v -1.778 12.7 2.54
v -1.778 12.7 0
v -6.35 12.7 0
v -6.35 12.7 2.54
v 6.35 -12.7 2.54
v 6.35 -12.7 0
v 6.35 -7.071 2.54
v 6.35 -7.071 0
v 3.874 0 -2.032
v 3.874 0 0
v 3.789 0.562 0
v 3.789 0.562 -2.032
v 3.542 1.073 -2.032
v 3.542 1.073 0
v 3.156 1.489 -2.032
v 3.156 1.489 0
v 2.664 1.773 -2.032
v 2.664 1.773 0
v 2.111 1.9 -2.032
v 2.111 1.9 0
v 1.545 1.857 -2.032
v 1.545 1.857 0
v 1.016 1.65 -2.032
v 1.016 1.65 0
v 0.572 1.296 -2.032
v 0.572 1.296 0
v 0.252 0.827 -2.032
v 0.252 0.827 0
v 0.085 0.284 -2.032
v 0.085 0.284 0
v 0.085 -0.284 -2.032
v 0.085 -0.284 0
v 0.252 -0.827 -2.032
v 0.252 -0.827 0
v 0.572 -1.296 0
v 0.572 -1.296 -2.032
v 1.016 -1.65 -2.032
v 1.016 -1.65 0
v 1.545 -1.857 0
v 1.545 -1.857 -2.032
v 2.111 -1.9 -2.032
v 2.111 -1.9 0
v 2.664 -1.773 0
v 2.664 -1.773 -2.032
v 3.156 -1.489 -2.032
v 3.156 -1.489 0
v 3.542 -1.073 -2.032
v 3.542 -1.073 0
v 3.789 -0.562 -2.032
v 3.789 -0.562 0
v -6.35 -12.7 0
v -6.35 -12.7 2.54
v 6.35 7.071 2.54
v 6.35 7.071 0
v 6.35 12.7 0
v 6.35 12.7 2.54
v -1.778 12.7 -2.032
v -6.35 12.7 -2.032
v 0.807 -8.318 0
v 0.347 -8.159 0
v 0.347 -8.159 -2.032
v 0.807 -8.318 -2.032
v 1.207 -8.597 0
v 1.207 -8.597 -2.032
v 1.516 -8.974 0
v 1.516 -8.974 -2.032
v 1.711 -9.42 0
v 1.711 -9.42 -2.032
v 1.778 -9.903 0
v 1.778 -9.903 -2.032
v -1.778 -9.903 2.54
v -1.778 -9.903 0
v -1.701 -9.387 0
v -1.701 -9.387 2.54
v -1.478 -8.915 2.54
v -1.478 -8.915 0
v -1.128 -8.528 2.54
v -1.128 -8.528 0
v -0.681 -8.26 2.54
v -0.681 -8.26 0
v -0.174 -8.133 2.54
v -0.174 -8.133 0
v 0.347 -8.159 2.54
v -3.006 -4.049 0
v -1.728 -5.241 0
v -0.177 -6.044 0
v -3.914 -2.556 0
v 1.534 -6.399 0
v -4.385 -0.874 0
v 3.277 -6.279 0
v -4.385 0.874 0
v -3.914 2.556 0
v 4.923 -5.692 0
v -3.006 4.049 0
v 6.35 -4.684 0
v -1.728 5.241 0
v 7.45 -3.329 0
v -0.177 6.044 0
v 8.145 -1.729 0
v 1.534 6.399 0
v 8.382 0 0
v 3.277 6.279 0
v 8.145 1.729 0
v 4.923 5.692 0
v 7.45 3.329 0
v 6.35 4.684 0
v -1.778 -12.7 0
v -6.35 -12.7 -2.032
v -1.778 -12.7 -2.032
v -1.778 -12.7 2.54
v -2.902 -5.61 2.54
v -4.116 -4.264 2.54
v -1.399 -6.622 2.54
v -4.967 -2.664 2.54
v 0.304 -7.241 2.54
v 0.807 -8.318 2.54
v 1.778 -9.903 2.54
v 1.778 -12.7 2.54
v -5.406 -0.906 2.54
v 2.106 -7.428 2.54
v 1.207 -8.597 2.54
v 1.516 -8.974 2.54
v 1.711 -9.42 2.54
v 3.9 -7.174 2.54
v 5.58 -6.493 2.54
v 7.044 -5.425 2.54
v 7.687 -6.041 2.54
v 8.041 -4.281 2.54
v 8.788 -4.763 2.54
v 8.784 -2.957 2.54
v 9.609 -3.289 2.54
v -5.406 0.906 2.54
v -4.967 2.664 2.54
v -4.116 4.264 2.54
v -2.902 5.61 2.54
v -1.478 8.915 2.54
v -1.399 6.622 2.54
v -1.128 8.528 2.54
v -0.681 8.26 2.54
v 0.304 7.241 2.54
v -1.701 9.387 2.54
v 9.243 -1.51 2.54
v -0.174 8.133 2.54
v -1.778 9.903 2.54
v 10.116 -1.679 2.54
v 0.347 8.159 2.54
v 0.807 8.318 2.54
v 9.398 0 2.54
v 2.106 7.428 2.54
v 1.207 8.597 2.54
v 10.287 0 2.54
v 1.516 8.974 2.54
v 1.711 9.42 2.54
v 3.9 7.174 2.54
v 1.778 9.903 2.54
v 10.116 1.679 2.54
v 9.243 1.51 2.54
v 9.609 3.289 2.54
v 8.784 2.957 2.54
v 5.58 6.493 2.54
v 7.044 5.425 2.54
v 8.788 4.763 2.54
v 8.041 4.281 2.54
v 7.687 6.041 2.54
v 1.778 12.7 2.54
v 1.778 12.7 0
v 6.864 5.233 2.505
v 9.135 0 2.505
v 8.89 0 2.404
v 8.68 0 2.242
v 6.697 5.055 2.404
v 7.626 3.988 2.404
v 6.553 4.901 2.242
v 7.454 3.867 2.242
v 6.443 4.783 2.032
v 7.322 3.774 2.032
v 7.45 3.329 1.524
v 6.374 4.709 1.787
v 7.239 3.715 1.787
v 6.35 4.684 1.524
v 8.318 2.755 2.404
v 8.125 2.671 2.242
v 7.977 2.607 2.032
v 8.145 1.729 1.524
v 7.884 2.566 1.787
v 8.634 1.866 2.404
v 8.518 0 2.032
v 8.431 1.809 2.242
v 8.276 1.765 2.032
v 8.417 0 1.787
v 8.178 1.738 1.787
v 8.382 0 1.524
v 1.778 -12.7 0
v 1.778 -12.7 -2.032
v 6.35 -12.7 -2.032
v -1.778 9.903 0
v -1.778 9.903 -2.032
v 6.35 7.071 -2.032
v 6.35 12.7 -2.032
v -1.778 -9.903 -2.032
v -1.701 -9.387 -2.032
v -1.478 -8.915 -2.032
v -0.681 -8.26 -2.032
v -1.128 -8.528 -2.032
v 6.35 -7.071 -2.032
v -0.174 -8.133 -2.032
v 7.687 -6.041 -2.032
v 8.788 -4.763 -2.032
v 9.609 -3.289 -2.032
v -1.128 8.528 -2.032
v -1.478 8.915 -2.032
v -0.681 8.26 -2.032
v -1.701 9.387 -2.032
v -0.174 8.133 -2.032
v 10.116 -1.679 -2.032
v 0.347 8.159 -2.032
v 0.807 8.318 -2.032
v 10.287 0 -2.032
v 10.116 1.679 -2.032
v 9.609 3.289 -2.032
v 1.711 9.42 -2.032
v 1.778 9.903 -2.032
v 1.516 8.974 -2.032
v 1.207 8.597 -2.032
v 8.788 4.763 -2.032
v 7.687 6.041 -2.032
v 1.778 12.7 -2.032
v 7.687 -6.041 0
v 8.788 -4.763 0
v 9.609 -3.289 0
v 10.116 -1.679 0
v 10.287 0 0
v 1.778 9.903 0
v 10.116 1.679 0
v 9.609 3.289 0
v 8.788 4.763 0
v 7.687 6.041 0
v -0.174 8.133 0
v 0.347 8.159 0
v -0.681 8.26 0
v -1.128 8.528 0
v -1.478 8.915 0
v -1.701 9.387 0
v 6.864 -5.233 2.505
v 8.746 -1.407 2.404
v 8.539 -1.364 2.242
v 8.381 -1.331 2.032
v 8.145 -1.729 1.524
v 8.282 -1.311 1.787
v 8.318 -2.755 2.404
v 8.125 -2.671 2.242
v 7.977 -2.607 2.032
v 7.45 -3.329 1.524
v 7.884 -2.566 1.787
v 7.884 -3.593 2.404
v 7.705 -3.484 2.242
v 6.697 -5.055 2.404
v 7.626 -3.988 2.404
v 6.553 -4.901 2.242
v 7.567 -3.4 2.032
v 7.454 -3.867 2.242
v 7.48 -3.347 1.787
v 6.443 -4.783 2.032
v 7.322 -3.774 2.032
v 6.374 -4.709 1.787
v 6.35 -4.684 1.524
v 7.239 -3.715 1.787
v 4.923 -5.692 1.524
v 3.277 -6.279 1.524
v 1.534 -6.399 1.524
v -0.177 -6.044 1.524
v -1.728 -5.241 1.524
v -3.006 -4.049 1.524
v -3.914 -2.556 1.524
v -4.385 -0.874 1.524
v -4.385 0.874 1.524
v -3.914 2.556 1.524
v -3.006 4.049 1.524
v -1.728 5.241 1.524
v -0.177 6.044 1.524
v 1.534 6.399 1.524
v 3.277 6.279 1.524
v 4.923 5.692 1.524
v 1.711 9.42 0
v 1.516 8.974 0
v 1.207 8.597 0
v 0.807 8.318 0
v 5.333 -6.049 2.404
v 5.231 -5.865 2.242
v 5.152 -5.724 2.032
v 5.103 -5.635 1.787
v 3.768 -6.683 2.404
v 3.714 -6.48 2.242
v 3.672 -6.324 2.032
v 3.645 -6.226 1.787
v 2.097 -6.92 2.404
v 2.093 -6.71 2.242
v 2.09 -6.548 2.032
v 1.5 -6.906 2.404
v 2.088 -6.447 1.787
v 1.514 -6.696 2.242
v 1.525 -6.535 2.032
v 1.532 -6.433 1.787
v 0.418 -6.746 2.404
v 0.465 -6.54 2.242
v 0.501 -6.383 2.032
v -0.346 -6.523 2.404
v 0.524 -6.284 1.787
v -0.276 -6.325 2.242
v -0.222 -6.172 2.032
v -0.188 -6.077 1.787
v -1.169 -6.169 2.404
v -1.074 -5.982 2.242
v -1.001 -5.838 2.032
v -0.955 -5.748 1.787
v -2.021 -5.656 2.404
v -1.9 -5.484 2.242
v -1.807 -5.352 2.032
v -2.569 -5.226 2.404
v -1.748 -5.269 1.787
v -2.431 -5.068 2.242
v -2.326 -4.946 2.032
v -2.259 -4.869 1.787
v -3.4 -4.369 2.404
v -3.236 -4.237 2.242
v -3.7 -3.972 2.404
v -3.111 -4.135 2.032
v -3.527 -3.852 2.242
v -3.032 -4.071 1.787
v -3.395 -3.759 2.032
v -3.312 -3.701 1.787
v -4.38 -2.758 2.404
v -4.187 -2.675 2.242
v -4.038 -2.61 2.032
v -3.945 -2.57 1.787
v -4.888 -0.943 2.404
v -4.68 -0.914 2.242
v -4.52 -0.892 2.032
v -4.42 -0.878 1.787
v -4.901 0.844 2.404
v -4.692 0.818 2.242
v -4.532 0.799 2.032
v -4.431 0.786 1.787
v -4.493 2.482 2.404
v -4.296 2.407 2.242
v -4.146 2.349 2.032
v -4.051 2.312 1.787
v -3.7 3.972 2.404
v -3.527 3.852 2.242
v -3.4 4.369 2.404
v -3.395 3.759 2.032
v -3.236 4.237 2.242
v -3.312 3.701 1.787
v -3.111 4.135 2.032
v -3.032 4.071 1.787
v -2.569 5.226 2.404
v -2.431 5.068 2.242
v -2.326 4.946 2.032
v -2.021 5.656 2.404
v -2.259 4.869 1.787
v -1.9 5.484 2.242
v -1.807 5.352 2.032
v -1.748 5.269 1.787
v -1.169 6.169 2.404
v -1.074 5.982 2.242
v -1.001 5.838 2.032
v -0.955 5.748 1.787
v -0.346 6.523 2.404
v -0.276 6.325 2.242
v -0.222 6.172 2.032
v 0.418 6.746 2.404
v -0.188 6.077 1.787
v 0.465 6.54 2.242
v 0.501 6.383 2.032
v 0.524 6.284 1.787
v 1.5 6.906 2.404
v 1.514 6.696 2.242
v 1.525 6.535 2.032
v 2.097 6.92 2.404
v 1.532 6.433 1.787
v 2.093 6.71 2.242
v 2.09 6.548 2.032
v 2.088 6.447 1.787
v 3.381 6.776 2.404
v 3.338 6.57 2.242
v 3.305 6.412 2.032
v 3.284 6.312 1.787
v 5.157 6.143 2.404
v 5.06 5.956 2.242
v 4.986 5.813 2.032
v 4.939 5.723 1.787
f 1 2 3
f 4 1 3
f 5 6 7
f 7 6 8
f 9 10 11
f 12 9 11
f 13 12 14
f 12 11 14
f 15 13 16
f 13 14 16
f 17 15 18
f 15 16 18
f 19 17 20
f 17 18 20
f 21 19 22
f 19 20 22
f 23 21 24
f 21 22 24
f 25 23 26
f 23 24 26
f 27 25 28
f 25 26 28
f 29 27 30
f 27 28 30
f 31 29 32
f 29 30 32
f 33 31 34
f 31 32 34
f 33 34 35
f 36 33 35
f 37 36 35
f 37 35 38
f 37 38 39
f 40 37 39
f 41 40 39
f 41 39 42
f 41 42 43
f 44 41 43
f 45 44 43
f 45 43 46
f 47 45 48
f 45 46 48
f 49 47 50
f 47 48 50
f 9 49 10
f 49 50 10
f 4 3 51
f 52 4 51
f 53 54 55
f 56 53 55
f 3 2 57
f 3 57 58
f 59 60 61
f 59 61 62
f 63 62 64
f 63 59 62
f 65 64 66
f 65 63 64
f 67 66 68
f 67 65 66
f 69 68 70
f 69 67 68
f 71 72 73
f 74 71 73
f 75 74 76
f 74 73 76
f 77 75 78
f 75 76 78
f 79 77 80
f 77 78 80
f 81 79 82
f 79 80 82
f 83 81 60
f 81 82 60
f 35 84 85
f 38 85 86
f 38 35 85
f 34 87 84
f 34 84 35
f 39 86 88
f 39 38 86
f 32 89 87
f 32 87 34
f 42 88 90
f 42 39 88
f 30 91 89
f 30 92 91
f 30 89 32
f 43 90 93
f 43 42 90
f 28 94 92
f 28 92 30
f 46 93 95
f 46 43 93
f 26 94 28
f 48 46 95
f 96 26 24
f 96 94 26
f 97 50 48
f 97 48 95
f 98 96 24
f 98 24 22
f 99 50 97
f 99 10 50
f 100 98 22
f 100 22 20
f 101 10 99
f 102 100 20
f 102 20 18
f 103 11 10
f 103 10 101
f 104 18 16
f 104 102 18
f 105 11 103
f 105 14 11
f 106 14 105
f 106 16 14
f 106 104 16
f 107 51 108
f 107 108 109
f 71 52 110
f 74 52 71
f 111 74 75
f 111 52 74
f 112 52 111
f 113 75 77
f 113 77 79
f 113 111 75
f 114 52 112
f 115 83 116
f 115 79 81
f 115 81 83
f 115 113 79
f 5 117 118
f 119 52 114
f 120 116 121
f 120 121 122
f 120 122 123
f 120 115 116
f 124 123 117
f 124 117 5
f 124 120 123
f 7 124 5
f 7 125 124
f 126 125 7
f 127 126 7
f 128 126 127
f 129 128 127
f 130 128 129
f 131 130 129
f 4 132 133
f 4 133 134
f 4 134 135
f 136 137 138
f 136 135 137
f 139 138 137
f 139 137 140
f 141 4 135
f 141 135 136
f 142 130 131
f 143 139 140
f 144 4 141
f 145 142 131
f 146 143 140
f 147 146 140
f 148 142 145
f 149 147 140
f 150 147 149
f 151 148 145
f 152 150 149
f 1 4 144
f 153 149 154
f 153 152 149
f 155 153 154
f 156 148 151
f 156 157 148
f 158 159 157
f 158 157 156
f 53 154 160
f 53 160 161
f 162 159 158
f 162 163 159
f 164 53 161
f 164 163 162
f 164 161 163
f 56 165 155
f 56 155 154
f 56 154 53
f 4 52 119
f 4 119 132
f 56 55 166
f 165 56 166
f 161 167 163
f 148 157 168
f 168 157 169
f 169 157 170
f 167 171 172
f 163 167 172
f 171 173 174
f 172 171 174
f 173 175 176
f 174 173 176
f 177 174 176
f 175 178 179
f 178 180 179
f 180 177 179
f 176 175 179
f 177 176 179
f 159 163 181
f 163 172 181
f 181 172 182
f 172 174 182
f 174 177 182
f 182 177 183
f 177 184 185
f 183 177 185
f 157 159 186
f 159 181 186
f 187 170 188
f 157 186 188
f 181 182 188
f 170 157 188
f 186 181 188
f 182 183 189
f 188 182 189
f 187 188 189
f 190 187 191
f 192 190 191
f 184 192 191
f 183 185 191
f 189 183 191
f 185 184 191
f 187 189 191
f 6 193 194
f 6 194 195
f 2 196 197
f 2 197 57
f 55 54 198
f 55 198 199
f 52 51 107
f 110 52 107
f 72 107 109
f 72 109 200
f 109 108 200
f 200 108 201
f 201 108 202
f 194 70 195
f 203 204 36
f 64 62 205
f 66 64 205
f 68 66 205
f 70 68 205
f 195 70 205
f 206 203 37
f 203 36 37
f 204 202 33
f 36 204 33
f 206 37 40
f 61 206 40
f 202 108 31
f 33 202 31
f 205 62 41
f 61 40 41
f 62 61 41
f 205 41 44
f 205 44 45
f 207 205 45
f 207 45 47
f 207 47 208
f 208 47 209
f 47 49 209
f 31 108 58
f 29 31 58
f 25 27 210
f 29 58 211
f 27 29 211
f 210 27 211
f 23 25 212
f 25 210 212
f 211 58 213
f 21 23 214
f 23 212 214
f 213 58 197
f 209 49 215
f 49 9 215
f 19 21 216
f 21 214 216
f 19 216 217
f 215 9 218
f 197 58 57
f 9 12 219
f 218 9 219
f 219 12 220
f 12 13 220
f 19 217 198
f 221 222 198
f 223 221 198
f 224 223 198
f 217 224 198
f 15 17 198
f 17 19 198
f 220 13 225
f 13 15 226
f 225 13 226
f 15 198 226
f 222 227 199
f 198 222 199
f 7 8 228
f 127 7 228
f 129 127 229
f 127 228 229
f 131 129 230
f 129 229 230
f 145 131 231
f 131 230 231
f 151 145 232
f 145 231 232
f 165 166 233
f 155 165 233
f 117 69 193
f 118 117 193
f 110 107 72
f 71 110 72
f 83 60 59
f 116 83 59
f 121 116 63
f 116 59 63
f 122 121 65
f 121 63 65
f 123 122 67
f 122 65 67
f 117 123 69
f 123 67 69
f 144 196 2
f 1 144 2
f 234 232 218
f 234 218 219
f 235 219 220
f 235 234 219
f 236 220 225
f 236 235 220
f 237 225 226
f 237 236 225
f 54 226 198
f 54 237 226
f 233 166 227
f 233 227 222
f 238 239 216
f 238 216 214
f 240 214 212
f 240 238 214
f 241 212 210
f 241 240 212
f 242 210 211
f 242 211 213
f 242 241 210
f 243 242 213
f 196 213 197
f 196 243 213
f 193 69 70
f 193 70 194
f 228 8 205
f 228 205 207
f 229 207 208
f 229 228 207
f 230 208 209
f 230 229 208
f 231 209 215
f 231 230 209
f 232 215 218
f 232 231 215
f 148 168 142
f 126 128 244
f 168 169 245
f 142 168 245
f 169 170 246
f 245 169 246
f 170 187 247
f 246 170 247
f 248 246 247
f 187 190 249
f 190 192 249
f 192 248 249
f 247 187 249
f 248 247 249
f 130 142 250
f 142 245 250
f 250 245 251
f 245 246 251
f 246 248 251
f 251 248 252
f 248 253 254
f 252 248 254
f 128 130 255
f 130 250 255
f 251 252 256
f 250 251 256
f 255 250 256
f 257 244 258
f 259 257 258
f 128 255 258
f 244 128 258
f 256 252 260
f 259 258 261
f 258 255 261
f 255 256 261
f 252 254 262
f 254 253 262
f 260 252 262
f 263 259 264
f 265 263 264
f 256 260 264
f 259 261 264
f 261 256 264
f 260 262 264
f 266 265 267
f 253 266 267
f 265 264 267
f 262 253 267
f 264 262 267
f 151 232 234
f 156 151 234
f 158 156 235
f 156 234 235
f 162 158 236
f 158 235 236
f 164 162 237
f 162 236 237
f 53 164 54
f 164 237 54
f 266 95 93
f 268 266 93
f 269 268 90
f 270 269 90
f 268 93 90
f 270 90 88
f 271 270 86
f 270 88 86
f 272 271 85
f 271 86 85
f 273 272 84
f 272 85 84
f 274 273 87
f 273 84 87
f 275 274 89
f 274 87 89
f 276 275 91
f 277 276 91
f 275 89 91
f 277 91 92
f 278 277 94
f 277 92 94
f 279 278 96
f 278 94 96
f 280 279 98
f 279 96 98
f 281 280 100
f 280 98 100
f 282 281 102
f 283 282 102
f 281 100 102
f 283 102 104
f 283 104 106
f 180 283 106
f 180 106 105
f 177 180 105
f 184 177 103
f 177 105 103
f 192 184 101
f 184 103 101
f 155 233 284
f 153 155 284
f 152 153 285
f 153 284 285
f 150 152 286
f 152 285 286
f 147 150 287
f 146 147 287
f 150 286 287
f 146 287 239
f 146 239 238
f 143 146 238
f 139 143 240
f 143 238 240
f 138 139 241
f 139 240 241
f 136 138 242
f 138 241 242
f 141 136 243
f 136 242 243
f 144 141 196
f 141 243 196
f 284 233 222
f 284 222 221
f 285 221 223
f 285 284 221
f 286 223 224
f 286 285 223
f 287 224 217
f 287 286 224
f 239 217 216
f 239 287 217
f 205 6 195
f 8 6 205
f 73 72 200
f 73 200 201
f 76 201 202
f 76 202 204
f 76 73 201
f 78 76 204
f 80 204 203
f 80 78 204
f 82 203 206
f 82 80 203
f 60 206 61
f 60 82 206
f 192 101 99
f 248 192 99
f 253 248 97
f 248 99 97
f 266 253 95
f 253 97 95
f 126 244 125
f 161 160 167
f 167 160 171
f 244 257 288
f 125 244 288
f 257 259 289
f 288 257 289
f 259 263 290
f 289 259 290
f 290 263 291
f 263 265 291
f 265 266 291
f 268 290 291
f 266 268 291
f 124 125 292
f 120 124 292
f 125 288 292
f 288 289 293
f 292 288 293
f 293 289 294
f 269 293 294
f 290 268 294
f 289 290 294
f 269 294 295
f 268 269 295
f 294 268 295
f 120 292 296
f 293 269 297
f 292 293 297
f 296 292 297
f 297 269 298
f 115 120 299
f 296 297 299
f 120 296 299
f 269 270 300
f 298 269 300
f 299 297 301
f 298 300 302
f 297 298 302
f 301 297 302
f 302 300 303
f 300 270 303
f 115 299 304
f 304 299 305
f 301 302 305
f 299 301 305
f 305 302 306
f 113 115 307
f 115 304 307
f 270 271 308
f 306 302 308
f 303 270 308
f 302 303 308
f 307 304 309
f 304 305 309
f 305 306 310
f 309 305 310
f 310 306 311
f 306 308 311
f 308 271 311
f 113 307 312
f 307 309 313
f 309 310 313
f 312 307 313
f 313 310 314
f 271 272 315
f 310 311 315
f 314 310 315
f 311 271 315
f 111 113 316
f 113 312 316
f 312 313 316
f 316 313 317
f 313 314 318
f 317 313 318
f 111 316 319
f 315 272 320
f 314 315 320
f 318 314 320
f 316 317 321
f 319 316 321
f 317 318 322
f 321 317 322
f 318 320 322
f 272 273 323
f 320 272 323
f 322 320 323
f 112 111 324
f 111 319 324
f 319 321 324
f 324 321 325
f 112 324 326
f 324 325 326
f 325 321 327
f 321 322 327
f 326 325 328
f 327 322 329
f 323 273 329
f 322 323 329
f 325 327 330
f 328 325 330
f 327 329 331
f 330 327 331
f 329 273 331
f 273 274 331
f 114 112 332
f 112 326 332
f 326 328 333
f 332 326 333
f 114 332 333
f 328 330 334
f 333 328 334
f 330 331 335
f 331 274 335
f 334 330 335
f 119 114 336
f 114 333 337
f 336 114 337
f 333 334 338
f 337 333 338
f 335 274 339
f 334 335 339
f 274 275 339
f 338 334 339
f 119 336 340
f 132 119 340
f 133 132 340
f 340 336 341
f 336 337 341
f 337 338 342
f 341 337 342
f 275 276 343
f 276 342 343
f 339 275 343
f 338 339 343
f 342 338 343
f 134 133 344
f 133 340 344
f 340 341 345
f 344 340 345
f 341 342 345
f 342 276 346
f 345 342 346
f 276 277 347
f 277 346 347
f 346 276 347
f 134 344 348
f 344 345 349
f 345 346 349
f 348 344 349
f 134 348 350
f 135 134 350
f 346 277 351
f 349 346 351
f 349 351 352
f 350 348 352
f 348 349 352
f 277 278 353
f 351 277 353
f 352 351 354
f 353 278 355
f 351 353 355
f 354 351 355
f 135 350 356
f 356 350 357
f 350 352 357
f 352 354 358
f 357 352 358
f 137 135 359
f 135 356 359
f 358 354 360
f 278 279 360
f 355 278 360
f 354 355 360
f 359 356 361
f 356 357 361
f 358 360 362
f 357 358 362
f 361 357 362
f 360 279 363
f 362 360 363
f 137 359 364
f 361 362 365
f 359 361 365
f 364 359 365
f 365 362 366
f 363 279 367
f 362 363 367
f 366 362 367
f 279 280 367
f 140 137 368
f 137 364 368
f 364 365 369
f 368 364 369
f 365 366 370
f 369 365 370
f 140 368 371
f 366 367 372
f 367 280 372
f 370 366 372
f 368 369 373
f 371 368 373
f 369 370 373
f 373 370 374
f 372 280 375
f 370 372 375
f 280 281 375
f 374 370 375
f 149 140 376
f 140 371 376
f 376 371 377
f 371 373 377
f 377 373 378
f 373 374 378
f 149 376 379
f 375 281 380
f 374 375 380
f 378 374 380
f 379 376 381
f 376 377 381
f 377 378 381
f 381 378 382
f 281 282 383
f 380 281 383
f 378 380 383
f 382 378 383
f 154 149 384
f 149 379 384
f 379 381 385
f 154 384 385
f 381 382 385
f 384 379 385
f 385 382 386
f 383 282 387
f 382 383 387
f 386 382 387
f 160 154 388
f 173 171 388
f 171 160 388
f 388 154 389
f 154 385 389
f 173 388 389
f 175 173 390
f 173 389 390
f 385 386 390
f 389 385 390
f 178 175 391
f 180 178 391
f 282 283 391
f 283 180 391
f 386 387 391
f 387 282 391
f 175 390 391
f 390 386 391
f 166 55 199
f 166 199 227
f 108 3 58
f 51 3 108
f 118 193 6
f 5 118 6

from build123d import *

# Parameters (mm, degrees)
F0_R     = 1.905
F1_DEPTH = 2.032
F2_DEPTH = 2.54
F3_R     = 1.016


# Not quite as in the source:
# - a feature names something its author has since deleted; it is built from what else it names


with BuildPart() as f1:
    # F0 (on Top) → F1 (new body)
    with BuildSketch(Plane.XY):
        with BuildLine():
            Line((6.35, 4.6835285843), (6.35, 7.0710607408))
            ThreePointArc((6.35, 7.0710607408), (3.4516559454, 8.1852117072), (0.3466541063, 8.1588637779))
            ThreePointArc((0.3466541063, 8.1588637779), (-4.4614598428, 5.2775997073), (-6.35, 1.93e-08))
            ThreePointArc((-6.35, 1.93e-08), (-4.4614598575, -5.2775996893), (0.3466540985, -8.1588637764))
            ThreePointArc((0.3466540985, -8.1588637764), (3.4516559415, -8.1852117079), (6.35, -7.0710607408))
            Line((6.35, -7.0710607408), (6.35, -4.6835285843))
            ThreePointArc((6.35, -4.6835285843), (-4.445, 0), (6.35, 4.6835285843))
        make_face()
        with BuildLine():
            ThreePointArc((10.287, 0), (9.2364071953, 4.0465994675), (6.35, 7.0710607408))
            Line((6.35, 7.0710607408), (6.35, 4.6835285843))
            ThreePointArc((6.35, 4.6835285843), (7.8521099675, 2.5526684078), (8.382, 0))
            ThreePointArc((8.382, 0), (7.8521099675, -2.5526684078), (6.35, -4.6835285843))
            Line((6.35, -4.6835285843), (6.35, -7.0710607408))
            ThreePointArc((6.35, -7.0710607408), (9.2364071953, -4.0465994675), (10.287, 0))
        make_face()
        with BuildLine():
            Line((-1.778, 9.9027430543), (-1.778, 12.7))
            Line((-1.778, 12.7), (-6.35, 12.7))
            Line((-6.35, 12.7), (-6.35, 1.93e-08))
            ThreePointArc((-6.35, 1.93e-08), (-4.4614598428, 5.2775997073), (0.3466541063, 8.1588637779))
            ThreePointArc((0.3466541063, 8.1588637779), (-1.1280365683, 8.528400484), (-1.778, 9.9027430543))
        make_face()
        with BuildLine():
            Line((6.35, 7.0710607408), (6.35, 12.7))
            Line((6.35, 12.7), (1.778, 12.7))
            Line((1.778, 12.7), (1.778, 9.9027430543))
            ThreePointArc((1.778, 9.9027430543), (1.3743425703, 8.774706486), (0.3466541063, 8.1588637779))
            ThreePointArc((0.3466541063, 8.1588637779), (3.4516559454, 8.1852117072), (6.35, 7.0710607408))
        make_face()
        with BuildLine():
            Line((6.35, -12.7), (6.35, -7.0710607408))
            ThreePointArc((6.35, -7.0710607408), (3.4516559415, -8.1852117079), (0.3466540985, -8.1588637764))
            ThreePointArc((0.3466540985, -8.1588637764), (1.3743425678, -8.7747064829), (1.778, -9.9027430543))
            Line((1.778, -9.9027430543), (1.778, -12.7))
            Line((1.778, -12.7), (6.35, -12.7))
        make_face()
        with BuildLine():
            ThreePointArc((0.3466540985, -8.1588637764), (-4.4614598575, -5.2775996893), (-6.35, 1.93e-08))
            Line((-6.35, 1.93e-08), (-6.35, -12.7))
            Line((-6.35, -12.7), (-1.778, -12.7))
            Line((-1.778, -12.7), (-1.778, -9.9027430543))
            ThreePointArc((-1.778, -9.9027430543), (-1.1280365714, -8.5284004866), (0.3466540985, -8.1588637764))
        make_face()
        with BuildLine():
            Line((6.35, -4.6835285843), (6.35, 4.6835285843))
            ThreePointArc((6.35, 4.6835285843), (-4.445, 0), (6.35, -4.6835285843))
        make_face()
        with Locations((1.9685, 0)):
            Circle(F0_R, mode=Mode.SUBTRACT)
        with BuildLine():
            ThreePointArc((8.382, 0), (7.8521099675, 2.5526684078), (6.35, 4.6835285843))
            Line((6.35, 4.6835285843), (6.35, -4.6835285843))
            ThreePointArc((6.35, -4.6835285843), (7.8521099675, -2.5526684078), (8.382, 0))
        make_face()
    extrude(amount=-F1_DEPTH)

    # F0 (on Top) → F2 (join)
    with BuildSketch(Plane.XY):
        with BuildLine():
            Line((6.35, 4.6835285843), (6.35, 7.0710607408))
            ThreePointArc((6.35, 7.0710607408), (3.4516559454, 8.1852117072), (0.3466541063, 8.1588637779))
            ThreePointArc((0.3466541063, 8.1588637779), (-4.4614598428, 5.2775997073), (-6.35, 1.93e-08))
            ThreePointArc((-6.35, 1.93e-08), (-4.4614598575, -5.2775996893), (0.3466540985, -8.1588637764))
            ThreePointArc((0.3466540985, -8.1588637764), (3.4516559415, -8.1852117079), (6.35, -7.0710607408))
            Line((6.35, -7.0710607408), (6.35, -4.6835285843))
            ThreePointArc((6.35, -4.6835285843), (-4.445, 0), (6.35, 4.6835285843))
        make_face()
        with BuildLine():
            ThreePointArc((10.287, 0), (9.2364071953, 4.0465994675), (6.35, 7.0710607408))
            Line((6.35, 7.0710607408), (6.35, 4.6835285843))
            ThreePointArc((6.35, 4.6835285843), (7.8521099675, 2.5526684078), (8.382, 0))
            ThreePointArc((8.382, 0), (7.8521099675, -2.5526684078), (6.35, -4.6835285843))
            Line((6.35, -4.6835285843), (6.35, -7.0710607408))
            ThreePointArc((6.35, -7.0710607408), (9.2364071953, -4.0465994675), (10.287, 0))
        make_face()
        with BuildLine():
            Line((6.35, 7.0710607408), (6.35, 12.7))
            Line((6.35, 12.7), (1.778, 12.7))
            Line((1.778, 12.7), (1.778, 9.9027430543))
            ThreePointArc((1.778, 9.9027430543), (1.3743425703, 8.774706486), (0.3466541063, 8.1588637779))
            ThreePointArc((0.3466541063, 8.1588637779), (3.4516559454, 8.1852117072), (6.35, 7.0710607408))
        make_face()
        with BuildLine():
            Line((-1.778, 9.9027430543), (-1.778, 12.7))
            Line((-1.778, 12.7), (-6.35, 12.7))
            Line((-6.35, 12.7), (-6.35, 1.93e-08))
            ThreePointArc((-6.35, 1.93e-08), (-4.4614598428, 5.2775997073), (0.3466541063, 8.1588637779))
            ThreePointArc((0.3466541063, 8.1588637779), (-1.1280365683, 8.528400484), (-1.778, 9.9027430543))
        make_face()
        with BuildLine():
            Line((6.35, -12.7), (6.35, -7.0710607408))
            ThreePointArc((6.35, -7.0710607408), (3.4516559415, -8.1852117079), (0.3466540985, -8.1588637764))
            ThreePointArc((0.3466540985, -8.1588637764), (1.3743425678, -8.7747064829), (1.778, -9.9027430543))
            Line((1.778, -9.9027430543), (1.778, -12.7))
            Line((1.778, -12.7), (6.35, -12.7))
        make_face()
        with BuildLine():
            ThreePointArc((0.3466540985, -8.1588637764), (-4.4614598575, -5.2775996893), (-6.35, 1.93e-08))
            Line((-6.35, 1.93e-08), (-6.35, -12.7))
            Line((-6.35, -12.7), (-1.778, -12.7))
            Line((-1.778, -12.7), (-1.778, -9.9027430543))
            ThreePointArc((-1.778, -9.9027430543), (-1.1280365714, -8.5284004866), (0.3466540985, -8.1588637764))
        make_face()
    extrude(amount=F2_DEPTH)

    # F3
    f3_edges = [f1.edges().sort_by_distance(p)[0] for p in [
        (-2.413, -4.683529, 2.54),
    ]]
    fillet(f3_edges, radius=F3_R)


solid = f1.part
